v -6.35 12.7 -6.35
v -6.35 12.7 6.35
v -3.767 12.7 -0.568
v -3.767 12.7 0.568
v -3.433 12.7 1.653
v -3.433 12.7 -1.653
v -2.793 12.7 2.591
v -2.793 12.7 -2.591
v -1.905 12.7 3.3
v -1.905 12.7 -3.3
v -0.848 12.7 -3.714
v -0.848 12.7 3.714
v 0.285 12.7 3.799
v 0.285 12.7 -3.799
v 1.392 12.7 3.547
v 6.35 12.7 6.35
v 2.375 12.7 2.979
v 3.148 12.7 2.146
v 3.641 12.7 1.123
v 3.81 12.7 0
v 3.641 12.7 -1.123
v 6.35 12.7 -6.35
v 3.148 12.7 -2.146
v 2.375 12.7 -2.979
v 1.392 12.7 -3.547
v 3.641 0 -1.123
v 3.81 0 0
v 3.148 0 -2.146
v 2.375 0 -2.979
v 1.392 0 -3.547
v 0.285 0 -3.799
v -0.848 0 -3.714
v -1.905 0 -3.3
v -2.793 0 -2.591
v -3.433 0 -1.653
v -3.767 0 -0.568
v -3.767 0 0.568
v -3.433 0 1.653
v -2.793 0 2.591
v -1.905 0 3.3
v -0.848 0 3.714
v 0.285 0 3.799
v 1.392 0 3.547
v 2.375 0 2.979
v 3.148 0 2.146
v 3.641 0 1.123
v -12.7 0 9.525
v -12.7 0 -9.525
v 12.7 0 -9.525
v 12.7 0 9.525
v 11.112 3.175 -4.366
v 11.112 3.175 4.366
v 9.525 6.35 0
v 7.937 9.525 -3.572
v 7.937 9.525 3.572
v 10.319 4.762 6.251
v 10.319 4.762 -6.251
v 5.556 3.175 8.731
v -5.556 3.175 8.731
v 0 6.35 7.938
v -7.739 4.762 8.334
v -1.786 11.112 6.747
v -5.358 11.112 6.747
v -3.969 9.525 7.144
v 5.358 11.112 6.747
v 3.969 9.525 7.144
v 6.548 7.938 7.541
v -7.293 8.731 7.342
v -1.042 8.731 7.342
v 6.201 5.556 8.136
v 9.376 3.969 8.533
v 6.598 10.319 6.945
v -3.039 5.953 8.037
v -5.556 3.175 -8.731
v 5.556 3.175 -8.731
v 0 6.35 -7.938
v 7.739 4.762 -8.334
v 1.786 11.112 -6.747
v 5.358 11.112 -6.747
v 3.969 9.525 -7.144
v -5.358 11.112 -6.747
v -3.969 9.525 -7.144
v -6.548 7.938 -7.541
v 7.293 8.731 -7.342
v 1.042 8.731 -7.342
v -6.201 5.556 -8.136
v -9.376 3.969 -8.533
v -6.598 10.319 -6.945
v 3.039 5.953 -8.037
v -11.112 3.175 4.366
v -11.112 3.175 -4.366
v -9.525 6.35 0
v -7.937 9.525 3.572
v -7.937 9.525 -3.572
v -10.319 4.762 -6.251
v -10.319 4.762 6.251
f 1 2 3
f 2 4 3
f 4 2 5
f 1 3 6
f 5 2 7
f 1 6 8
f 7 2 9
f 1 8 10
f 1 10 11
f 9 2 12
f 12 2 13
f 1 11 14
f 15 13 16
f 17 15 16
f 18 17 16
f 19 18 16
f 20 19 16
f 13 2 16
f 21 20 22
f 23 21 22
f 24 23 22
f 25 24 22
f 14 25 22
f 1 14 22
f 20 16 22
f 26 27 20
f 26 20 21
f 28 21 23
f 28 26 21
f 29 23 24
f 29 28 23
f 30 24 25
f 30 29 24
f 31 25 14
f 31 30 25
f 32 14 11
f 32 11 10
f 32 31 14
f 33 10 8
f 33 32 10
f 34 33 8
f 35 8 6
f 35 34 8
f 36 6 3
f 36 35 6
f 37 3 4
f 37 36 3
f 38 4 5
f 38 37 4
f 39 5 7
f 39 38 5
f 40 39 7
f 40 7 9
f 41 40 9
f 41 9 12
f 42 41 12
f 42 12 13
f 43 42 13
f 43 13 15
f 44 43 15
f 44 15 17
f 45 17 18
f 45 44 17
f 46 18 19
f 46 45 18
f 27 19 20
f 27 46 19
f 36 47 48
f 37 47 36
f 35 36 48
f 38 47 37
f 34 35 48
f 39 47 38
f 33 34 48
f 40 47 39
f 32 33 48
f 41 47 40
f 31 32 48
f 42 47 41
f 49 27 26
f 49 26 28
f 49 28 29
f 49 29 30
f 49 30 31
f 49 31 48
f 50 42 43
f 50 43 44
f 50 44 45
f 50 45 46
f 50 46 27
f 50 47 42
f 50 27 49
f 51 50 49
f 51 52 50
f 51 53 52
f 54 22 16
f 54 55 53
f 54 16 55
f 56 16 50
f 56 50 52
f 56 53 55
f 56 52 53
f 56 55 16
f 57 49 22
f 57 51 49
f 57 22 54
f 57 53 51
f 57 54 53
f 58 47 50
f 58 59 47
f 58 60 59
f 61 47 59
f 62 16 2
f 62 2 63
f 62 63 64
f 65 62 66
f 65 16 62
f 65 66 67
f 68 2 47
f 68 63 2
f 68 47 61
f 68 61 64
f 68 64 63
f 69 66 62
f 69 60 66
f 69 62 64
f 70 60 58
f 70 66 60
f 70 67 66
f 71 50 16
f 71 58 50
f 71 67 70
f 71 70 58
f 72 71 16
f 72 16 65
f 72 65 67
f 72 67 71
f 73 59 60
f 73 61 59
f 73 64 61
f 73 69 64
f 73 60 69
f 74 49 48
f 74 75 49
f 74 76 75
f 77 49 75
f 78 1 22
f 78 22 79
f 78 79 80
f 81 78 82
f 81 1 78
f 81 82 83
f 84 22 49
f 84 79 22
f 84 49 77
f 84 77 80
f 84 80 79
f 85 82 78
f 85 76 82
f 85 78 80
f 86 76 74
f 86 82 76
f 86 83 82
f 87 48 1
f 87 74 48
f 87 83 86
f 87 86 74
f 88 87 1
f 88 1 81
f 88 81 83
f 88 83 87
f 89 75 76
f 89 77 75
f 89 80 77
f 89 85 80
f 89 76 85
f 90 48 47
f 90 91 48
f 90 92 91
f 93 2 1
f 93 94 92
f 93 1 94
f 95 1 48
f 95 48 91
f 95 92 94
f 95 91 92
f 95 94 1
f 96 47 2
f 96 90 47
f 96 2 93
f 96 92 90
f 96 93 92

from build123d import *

# Parameters (mm, degrees)
HOLE_FOR_HOOK_START     = -12.7
HOLE_FOR_HOOK_OUTLINE_R = 3.81
HOLE_FOR_HOOK_DEPTH     = 12.7


# Read off the part's stored shape, not the designer's step: Hole-For-Hook
with BuildPart() as part:
    # Sketch-Rectangle → Loft1 section 0
    with BuildSketch(Plane(origin=(0, 0, 0), x_dir=(1, 0, 0), z_dir=(0, 1, 0))):
        with BuildLine():
            Line((-12.7, -9.525), (12.7, -9.525))
            Line((12.7, -9.525), (12.7, 9.525))
            Line((12.7, 9.525), (-12.7, 9.525))
            Line((-12.7, 9.525), (-12.7, -9.525))
        make_face()
    # Sketch-Square → Loft1 section 1
    with BuildSketch(Plane(origin=(0, 12.7, 0), x_dir=(1, 0, 0), z_dir=(0, 1, 0))):
        with BuildLine():
            Line((-6.35, -6.35), (6.35, -6.35))
            Line((6.35, -6.35), (6.35, 6.35))
            Line((6.35, 6.35), (-6.35, 6.35))
            Line((-6.35, 6.35), (-6.35, -6.35))
        make_face()
    loft()

    # Hole-For-Hook outline → Hole-For-Hook (cut)
    with BuildSketch(Plane(origin=(0, 12.7, 0), x_dir=(1, 0, 0), z_dir=(0, 1, 0)).offset(HOLE_FOR_HOOK_START)):
        Circle(HOLE_FOR_HOOK_OUTLINE_R)
    extrude(amount=HOLE_FOR_HOOK_DEPTH, mode=Mode.SUBTRACT)


solid = part.part
